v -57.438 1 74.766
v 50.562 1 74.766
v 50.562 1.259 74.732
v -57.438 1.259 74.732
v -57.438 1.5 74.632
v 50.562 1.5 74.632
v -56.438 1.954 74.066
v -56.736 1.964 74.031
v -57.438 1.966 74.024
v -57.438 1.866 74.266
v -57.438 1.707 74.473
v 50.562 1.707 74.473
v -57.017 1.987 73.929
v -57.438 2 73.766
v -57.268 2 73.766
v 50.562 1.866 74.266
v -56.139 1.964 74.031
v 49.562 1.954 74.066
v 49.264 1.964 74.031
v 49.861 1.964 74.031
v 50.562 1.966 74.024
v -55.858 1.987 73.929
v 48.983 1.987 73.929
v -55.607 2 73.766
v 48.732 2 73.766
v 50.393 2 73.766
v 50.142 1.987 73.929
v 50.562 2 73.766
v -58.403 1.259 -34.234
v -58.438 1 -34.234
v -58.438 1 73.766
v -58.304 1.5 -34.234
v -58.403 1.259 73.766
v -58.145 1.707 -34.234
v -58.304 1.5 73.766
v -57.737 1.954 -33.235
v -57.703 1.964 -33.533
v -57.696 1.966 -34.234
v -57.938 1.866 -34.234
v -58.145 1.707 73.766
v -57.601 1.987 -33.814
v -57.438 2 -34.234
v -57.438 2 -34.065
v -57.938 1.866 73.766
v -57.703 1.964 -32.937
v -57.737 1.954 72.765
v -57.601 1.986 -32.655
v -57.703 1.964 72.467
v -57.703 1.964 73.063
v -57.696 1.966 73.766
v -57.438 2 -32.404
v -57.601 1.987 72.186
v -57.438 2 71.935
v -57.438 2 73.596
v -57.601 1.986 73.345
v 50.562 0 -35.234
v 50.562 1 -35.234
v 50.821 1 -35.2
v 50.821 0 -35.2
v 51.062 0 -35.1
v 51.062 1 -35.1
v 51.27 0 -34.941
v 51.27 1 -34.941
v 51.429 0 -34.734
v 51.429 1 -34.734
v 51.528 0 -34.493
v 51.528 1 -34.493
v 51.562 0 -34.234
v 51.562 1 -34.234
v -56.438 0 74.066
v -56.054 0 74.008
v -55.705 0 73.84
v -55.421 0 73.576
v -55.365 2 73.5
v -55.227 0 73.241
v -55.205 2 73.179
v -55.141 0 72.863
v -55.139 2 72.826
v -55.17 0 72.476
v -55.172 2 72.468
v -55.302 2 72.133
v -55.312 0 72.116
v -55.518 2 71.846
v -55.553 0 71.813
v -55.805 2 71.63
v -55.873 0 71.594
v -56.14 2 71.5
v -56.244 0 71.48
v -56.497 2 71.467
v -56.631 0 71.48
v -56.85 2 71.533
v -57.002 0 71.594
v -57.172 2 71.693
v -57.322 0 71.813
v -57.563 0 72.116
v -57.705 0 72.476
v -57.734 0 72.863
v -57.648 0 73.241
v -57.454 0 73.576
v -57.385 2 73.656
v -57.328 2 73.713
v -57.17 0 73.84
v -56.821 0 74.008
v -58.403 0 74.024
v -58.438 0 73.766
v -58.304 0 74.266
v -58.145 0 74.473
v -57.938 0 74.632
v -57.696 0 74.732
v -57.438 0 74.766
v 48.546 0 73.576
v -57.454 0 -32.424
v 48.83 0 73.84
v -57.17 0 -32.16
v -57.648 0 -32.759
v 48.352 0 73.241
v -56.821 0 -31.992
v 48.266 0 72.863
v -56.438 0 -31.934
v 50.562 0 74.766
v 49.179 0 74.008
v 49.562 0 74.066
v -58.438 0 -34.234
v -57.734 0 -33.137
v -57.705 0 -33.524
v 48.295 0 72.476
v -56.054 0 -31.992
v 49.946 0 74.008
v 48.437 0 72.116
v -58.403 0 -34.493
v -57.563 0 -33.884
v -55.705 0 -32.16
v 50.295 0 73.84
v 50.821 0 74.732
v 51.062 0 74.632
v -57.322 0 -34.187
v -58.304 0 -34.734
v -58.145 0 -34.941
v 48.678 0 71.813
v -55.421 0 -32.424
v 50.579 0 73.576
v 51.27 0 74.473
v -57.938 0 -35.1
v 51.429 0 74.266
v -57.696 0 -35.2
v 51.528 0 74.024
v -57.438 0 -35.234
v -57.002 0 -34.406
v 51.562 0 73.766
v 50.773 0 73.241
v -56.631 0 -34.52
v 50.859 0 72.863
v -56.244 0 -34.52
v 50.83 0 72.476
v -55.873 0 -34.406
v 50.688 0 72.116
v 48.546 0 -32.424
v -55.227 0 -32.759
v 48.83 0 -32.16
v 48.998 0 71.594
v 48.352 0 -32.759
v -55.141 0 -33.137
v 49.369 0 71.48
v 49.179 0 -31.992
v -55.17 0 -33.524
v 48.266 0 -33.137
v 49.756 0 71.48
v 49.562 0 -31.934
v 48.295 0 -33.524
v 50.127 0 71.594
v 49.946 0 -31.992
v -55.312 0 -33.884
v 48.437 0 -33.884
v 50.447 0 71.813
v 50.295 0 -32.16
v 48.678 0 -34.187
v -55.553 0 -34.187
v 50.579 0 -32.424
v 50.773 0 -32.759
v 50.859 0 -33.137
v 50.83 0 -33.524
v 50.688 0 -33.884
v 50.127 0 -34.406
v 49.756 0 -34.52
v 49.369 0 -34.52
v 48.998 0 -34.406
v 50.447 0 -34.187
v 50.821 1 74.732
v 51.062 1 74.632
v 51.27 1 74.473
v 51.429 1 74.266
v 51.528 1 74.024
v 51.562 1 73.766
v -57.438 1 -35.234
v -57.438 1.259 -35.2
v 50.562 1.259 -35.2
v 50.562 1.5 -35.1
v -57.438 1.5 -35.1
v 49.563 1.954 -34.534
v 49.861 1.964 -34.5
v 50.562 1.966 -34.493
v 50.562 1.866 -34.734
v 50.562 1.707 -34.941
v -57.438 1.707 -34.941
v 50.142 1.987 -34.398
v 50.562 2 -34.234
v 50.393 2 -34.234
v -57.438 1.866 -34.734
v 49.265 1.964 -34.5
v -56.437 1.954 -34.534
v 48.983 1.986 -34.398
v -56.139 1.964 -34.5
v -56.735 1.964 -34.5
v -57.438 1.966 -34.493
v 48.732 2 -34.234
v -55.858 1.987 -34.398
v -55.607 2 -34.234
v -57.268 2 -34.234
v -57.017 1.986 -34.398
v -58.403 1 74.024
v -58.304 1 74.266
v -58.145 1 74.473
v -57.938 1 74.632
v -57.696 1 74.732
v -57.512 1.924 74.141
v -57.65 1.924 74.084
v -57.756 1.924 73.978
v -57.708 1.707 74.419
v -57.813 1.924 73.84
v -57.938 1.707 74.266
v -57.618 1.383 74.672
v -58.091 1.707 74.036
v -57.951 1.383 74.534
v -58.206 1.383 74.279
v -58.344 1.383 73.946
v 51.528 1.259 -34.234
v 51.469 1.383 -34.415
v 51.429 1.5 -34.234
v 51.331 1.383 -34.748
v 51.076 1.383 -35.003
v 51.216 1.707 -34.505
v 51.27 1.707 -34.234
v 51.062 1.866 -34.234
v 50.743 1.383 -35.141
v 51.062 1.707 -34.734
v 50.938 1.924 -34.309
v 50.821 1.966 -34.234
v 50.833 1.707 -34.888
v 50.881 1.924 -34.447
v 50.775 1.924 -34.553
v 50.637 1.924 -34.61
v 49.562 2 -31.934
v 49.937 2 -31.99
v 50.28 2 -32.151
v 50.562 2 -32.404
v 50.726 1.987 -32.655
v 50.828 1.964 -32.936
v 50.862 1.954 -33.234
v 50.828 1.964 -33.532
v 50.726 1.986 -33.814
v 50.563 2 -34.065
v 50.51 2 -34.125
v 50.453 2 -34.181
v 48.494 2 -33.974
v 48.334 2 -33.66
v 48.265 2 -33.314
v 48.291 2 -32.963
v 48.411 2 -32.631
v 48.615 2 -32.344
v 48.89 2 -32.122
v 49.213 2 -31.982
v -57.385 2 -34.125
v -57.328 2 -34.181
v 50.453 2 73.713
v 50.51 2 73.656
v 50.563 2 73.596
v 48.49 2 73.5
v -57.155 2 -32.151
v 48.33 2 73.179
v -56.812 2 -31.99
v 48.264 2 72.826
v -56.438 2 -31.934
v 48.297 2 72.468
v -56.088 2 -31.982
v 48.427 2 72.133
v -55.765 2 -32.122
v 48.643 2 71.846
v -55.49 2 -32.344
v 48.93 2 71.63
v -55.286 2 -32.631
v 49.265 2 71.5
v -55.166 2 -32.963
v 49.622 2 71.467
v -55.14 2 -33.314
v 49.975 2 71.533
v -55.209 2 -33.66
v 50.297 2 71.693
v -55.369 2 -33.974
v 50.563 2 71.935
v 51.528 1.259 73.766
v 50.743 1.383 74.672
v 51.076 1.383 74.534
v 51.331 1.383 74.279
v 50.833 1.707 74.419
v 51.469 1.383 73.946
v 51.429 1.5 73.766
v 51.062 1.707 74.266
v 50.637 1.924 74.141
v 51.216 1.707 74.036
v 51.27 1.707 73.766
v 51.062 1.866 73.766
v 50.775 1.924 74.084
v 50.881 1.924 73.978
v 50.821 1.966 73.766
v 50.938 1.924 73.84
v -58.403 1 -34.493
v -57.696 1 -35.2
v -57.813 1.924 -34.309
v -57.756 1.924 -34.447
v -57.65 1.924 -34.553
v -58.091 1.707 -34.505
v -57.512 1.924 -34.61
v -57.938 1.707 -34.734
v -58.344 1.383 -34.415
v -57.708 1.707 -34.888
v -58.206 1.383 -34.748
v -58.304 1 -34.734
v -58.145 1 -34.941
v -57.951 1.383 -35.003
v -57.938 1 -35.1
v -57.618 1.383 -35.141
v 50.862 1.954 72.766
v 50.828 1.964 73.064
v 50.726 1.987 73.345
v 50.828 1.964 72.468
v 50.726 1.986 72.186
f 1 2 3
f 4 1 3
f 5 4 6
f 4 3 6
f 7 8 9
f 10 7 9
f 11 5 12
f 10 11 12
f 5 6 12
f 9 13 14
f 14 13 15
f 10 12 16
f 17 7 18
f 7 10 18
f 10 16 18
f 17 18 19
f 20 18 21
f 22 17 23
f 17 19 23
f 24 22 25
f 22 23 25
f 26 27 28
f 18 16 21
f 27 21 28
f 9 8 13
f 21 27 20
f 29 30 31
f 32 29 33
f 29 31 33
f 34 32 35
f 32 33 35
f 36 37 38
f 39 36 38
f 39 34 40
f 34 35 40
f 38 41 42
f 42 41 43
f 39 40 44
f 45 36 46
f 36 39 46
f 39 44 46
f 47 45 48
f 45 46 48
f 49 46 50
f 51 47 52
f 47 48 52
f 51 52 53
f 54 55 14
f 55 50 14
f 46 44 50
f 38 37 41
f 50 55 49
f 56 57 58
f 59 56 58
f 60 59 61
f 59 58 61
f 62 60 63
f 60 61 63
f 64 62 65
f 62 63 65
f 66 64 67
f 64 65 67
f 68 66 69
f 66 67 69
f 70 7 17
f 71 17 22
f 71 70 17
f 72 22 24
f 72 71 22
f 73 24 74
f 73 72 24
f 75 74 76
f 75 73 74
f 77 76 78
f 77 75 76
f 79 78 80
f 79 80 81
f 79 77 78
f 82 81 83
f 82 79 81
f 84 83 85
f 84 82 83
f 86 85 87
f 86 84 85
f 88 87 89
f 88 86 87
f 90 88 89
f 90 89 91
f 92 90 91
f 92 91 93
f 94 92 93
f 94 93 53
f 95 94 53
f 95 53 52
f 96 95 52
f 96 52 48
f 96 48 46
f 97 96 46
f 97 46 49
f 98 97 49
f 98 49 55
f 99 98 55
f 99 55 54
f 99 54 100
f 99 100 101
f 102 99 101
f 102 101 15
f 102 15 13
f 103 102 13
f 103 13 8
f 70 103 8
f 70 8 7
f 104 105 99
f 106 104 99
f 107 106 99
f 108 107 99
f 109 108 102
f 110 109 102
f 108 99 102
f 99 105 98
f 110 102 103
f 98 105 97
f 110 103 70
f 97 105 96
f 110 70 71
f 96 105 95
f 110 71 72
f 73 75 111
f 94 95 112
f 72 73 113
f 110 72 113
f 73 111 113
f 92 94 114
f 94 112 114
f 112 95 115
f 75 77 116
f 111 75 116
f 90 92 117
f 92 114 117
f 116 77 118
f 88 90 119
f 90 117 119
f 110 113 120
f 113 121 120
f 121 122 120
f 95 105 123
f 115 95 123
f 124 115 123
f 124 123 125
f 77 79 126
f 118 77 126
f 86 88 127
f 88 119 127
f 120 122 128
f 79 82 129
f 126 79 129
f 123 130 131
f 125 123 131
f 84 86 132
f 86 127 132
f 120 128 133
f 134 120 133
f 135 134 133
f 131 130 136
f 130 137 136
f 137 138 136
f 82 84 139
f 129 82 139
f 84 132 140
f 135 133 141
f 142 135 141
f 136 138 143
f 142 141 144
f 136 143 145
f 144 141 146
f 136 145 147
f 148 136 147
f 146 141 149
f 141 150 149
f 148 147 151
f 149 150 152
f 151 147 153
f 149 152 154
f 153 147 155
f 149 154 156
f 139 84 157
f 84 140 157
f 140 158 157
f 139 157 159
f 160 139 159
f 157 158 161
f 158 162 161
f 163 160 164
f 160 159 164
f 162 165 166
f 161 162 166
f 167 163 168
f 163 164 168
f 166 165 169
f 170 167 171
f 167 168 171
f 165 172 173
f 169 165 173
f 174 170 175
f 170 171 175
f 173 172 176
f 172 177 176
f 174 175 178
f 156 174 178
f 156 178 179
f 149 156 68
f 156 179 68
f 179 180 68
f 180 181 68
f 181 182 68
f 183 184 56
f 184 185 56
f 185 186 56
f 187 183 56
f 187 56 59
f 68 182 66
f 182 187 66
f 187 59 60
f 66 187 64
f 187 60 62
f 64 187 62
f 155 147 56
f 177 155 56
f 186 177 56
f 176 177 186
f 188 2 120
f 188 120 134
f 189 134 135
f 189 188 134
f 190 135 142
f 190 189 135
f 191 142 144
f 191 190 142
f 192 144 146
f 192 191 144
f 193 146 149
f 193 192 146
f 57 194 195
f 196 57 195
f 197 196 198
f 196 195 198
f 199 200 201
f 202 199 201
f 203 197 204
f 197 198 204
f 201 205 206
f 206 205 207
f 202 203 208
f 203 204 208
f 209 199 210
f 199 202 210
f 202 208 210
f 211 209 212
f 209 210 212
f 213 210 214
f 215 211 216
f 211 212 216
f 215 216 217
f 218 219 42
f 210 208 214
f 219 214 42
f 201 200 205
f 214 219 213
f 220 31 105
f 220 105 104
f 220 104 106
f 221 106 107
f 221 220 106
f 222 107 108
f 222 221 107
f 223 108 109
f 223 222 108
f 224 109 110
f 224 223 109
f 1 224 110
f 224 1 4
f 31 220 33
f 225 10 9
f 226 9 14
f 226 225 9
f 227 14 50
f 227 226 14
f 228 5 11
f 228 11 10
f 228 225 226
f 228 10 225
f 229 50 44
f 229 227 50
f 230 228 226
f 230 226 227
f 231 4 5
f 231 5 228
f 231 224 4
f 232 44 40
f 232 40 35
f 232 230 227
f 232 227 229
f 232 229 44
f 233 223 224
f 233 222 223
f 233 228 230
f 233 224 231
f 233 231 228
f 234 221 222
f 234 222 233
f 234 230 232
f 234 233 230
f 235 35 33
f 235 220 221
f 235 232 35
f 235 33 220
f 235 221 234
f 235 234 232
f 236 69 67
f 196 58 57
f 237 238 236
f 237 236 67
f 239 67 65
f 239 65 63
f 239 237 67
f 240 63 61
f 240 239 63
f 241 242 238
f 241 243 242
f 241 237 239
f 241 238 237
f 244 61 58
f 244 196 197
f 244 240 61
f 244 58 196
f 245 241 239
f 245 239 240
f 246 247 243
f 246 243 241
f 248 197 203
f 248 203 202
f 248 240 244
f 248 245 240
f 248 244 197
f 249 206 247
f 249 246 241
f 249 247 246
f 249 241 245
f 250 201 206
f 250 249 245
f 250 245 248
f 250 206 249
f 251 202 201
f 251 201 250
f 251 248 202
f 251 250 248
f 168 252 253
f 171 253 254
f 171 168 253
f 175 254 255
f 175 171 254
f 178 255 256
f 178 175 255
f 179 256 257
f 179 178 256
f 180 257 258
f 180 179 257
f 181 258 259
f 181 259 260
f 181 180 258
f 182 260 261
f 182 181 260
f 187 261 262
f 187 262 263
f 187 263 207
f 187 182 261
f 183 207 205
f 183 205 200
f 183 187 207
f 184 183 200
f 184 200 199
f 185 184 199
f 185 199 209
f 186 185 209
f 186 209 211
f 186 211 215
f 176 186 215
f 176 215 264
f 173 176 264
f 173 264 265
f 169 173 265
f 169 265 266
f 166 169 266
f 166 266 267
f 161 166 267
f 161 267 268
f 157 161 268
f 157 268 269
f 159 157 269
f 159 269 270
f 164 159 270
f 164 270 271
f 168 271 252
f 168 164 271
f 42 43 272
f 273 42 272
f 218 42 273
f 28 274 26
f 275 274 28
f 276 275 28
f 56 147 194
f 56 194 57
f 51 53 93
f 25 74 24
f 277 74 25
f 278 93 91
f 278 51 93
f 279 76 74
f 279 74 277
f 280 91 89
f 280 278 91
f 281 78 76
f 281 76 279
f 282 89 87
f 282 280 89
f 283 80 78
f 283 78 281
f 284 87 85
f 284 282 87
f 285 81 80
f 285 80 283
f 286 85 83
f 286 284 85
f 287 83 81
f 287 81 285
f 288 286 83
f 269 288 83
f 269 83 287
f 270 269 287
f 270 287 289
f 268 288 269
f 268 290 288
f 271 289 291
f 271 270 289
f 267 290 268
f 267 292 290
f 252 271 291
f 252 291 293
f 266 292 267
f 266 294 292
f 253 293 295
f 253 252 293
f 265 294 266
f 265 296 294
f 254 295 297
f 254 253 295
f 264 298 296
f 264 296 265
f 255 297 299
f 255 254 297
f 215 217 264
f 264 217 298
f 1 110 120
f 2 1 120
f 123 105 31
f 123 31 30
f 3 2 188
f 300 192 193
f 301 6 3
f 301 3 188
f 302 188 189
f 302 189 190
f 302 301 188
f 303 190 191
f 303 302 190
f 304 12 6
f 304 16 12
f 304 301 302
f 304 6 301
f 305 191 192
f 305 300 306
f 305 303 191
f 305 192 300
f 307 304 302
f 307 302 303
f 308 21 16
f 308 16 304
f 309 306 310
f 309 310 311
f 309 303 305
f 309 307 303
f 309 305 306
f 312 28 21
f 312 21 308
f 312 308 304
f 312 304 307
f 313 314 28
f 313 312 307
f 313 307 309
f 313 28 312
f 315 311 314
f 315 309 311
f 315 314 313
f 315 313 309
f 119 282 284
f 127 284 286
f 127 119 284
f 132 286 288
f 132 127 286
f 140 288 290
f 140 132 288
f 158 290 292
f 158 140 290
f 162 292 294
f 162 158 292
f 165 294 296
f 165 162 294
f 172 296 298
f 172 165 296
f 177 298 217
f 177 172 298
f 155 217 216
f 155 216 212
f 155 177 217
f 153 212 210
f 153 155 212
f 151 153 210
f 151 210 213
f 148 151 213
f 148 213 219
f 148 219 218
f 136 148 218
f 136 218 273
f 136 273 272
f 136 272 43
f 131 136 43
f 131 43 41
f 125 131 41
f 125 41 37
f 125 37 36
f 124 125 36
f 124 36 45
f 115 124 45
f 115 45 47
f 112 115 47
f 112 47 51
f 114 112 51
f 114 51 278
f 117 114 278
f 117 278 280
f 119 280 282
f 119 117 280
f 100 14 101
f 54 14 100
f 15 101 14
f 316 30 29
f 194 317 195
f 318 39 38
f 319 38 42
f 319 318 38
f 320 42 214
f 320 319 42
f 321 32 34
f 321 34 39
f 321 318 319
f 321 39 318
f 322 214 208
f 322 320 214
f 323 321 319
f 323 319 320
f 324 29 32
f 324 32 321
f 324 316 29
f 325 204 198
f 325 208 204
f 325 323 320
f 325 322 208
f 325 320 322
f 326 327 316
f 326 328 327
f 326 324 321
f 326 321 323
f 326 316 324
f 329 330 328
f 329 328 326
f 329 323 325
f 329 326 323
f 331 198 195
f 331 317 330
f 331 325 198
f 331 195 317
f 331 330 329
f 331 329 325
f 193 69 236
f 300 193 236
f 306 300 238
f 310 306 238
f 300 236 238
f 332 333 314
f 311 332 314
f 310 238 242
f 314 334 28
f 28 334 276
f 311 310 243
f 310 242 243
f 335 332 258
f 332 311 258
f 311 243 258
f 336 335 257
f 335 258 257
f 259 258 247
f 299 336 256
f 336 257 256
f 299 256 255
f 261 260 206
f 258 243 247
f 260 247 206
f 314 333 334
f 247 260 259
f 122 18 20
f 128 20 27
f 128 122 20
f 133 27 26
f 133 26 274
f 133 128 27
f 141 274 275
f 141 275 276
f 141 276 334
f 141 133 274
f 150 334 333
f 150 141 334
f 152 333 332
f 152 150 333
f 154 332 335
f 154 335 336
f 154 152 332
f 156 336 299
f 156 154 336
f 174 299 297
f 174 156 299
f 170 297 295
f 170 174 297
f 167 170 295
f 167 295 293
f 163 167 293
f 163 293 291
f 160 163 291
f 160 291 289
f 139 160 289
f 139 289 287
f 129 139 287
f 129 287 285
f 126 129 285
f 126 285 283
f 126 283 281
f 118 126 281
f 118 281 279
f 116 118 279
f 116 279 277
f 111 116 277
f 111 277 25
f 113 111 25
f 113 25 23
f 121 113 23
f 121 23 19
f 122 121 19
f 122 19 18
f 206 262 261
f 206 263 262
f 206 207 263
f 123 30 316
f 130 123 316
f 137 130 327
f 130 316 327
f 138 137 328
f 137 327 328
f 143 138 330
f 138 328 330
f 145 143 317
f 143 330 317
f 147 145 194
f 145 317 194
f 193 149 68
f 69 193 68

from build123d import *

# Parameters (mm, degrees)
ESQUISSE1_W        = 110
ESQUISSE1_H        = 110
ESQUISSE1_R        = 1.3
BOSS_EXTRU_1_DEPTH = 2
CONG_2_R           = 1
CONG_3_R           = 1
CONG_5_R           = 1


with BuildPart() as part:
    # Esquisse1 → Boss.-Extru.1 (new body)
    with BuildSketch(Plane(origin=(0, 0, 0), x_dir=(1, 0, 0), z_dir=(0, 1, 0))):
        with Locations((-3.4375, -19.765625)):
            Rectangle(ESQUISSE1_W, ESQUISSE1_H)
        with Locations(Location((-56.4375, 33.234375, 0), (0, 0, 270))):
            Circle(ESQUISSE1_R, mode=Mode.SUBTRACT)
        with Locations(Location((49.5625, 33.234375, 0), (0, 0, 270))):
            Circle(ESQUISSE1_R, mode=Mode.SUBTRACT)
        with Locations(Location((-56.4375, -72.765625, 0), (0, 0, 270))):
            Circle(ESQUISSE1_R, mode=Mode.SUBTRACT)
        with Locations(Location((49.5625, -72.765625, 0), (0, 0, 270))):
            Circle(ESQUISSE1_R, mode=Mode.SUBTRACT)
    extrude(amount=BOSS_EXTRU_1_DEPTH)

    # Congé2
    cong_2_edges = [part.edges().sort_by_distance(p)[0] for p in [
        (-58.4375, 1, 74.765625),
    ]]
    fillet(cong_2_edges, radius=CONG_2_R)

    # Congé3
    cong_3_edges = [part.edges().sort_by_distance(p)[0] for p in [
        (-58.4375, 1, -35.234375),
        (51.5625, 1, -35.234375),
        (51.5625, 1, 74.765625),
    ]]
    fillet(cong_3_edges, radius=CONG_3_R)

    # Congé5
    # the kernel refuses this fillet: 1 mm, written as the material it takes off along each edge
    with BuildSketch(Plane(origin=(50.5625, 2, 74.765625), x_dir=(0, -1, 0), z_dir=(-1, 0, 0))) as cong_5_piece_1:
        with BuildLine():
            CenterArc((CONG_5_R, -CONG_5_R), CONG_5_R, 90, 90)
            Line((0, -CONG_5_R), (0, 0))
            Line((0, 0), (CONG_5_R, 0))
        make_face()
    extrude(amount=108, mode=Mode.SUBTRACT)
    with BuildSketch(Plane(origin=(-57.4375, 2, 73.765625), x_dir=(0, 0, 1), z_dir=(1, 0, 0))) as cong_5_piece_2:
        with BuildLine():
            CenterArc((1 - CONG_5_R, CONG_5_R), CONG_5_R, 270, 90)
            Line((1 - CONG_5_R, 0), (1, 0))
            Line((1, 0), (1, CONG_5_R))
        make_face()
    revolve(axis=Axis((-57.4375, 2, 73.765625), (0, -1, 0)), revolution_arc=90, mode=Mode.SUBTRACT)
    with BuildSketch(Plane(origin=(-58.4375, 2, 73.765625), x_dir=(1, 0, 0), z_dir=(0, 0, -1)), Plane(origin=(-57.4375, 2, -35.234375), x_dir=(0, 0, 1), z_dir=(1, 0, 0)), Plane(origin=(51.5625, 2, -34.234375), x_dir=(-1, 0, 0), z_dir=(0, 0, 1))) as cong_5_piece_3:
        with BuildLine():
            CenterArc((CONG_5_R, CONG_5_R), CONG_5_R, 180, 90)
            Line((0, CONG_5_R), (0, 0))
            Line((0, 0), (CONG_5_R, 0))
        make_face()
    extrude(amount=108, mode=Mode.SUBTRACT)
    with BuildSketch(Plane(origin=(50.5625, 2, 73.765625), x_dir=(0, 0, 1), z_dir=(-1, 0, 0))) as cong_5_piece_4:
        with BuildLine():
            CenterArc((1 - CONG_5_R, -CONG_5_R), CONG_5_R, 0, 90)
            Line((1 - CONG_5_R, 0), (1, 0))
            Line((1, 0), (1, -CONG_5_R))
        make_face()
    revolve(axis=Axis((50.5625, 2, 73.765625), (0, 1, 0)), revolution_arc=90, mode=Mode.SUBTRACT)
    with BuildSketch(Plane(origin=(50.5625, 2, -34.234375), x_dir=(1, 0, 0), z_dir=(0, 0, 1))) as cong_5_piece_5:
        with BuildLine():
            CenterArc((1 - CONG_5_R, -CONG_5_R), CONG_5_R, 0, 90)
            Line((1, -CONG_5_R), (1, 0))
            Line((1, 0), (1 - CONG_5_R, 0))
        make_face()
    revolve(axis=Axis((50.5625, 2, -34.234375), (0, 1, 0)), revolution_arc=90, mode=Mode.SUBTRACT)
    with BuildSketch(Plane(origin=(-57.4375, 2, -34.234375), x_dir=(-1, 0, 0), z_dir=(0, 0, 1))) as cong_5_piece_6:
        with BuildLine():
            CenterArc((1 - CONG_5_R, CONG_5_R), CONG_5_R, 270, 90)
            Line((1, CONG_5_R), (1, 0))
            Line((1, 0), (1 - CONG_5_R, 0))
        make_face()
    revolve(axis=Axis((-57.4375, 2, -34.234375), (0, -1, 0)), revolution_arc=90, mode=Mode.SUBTRACT)


solid = part.part
